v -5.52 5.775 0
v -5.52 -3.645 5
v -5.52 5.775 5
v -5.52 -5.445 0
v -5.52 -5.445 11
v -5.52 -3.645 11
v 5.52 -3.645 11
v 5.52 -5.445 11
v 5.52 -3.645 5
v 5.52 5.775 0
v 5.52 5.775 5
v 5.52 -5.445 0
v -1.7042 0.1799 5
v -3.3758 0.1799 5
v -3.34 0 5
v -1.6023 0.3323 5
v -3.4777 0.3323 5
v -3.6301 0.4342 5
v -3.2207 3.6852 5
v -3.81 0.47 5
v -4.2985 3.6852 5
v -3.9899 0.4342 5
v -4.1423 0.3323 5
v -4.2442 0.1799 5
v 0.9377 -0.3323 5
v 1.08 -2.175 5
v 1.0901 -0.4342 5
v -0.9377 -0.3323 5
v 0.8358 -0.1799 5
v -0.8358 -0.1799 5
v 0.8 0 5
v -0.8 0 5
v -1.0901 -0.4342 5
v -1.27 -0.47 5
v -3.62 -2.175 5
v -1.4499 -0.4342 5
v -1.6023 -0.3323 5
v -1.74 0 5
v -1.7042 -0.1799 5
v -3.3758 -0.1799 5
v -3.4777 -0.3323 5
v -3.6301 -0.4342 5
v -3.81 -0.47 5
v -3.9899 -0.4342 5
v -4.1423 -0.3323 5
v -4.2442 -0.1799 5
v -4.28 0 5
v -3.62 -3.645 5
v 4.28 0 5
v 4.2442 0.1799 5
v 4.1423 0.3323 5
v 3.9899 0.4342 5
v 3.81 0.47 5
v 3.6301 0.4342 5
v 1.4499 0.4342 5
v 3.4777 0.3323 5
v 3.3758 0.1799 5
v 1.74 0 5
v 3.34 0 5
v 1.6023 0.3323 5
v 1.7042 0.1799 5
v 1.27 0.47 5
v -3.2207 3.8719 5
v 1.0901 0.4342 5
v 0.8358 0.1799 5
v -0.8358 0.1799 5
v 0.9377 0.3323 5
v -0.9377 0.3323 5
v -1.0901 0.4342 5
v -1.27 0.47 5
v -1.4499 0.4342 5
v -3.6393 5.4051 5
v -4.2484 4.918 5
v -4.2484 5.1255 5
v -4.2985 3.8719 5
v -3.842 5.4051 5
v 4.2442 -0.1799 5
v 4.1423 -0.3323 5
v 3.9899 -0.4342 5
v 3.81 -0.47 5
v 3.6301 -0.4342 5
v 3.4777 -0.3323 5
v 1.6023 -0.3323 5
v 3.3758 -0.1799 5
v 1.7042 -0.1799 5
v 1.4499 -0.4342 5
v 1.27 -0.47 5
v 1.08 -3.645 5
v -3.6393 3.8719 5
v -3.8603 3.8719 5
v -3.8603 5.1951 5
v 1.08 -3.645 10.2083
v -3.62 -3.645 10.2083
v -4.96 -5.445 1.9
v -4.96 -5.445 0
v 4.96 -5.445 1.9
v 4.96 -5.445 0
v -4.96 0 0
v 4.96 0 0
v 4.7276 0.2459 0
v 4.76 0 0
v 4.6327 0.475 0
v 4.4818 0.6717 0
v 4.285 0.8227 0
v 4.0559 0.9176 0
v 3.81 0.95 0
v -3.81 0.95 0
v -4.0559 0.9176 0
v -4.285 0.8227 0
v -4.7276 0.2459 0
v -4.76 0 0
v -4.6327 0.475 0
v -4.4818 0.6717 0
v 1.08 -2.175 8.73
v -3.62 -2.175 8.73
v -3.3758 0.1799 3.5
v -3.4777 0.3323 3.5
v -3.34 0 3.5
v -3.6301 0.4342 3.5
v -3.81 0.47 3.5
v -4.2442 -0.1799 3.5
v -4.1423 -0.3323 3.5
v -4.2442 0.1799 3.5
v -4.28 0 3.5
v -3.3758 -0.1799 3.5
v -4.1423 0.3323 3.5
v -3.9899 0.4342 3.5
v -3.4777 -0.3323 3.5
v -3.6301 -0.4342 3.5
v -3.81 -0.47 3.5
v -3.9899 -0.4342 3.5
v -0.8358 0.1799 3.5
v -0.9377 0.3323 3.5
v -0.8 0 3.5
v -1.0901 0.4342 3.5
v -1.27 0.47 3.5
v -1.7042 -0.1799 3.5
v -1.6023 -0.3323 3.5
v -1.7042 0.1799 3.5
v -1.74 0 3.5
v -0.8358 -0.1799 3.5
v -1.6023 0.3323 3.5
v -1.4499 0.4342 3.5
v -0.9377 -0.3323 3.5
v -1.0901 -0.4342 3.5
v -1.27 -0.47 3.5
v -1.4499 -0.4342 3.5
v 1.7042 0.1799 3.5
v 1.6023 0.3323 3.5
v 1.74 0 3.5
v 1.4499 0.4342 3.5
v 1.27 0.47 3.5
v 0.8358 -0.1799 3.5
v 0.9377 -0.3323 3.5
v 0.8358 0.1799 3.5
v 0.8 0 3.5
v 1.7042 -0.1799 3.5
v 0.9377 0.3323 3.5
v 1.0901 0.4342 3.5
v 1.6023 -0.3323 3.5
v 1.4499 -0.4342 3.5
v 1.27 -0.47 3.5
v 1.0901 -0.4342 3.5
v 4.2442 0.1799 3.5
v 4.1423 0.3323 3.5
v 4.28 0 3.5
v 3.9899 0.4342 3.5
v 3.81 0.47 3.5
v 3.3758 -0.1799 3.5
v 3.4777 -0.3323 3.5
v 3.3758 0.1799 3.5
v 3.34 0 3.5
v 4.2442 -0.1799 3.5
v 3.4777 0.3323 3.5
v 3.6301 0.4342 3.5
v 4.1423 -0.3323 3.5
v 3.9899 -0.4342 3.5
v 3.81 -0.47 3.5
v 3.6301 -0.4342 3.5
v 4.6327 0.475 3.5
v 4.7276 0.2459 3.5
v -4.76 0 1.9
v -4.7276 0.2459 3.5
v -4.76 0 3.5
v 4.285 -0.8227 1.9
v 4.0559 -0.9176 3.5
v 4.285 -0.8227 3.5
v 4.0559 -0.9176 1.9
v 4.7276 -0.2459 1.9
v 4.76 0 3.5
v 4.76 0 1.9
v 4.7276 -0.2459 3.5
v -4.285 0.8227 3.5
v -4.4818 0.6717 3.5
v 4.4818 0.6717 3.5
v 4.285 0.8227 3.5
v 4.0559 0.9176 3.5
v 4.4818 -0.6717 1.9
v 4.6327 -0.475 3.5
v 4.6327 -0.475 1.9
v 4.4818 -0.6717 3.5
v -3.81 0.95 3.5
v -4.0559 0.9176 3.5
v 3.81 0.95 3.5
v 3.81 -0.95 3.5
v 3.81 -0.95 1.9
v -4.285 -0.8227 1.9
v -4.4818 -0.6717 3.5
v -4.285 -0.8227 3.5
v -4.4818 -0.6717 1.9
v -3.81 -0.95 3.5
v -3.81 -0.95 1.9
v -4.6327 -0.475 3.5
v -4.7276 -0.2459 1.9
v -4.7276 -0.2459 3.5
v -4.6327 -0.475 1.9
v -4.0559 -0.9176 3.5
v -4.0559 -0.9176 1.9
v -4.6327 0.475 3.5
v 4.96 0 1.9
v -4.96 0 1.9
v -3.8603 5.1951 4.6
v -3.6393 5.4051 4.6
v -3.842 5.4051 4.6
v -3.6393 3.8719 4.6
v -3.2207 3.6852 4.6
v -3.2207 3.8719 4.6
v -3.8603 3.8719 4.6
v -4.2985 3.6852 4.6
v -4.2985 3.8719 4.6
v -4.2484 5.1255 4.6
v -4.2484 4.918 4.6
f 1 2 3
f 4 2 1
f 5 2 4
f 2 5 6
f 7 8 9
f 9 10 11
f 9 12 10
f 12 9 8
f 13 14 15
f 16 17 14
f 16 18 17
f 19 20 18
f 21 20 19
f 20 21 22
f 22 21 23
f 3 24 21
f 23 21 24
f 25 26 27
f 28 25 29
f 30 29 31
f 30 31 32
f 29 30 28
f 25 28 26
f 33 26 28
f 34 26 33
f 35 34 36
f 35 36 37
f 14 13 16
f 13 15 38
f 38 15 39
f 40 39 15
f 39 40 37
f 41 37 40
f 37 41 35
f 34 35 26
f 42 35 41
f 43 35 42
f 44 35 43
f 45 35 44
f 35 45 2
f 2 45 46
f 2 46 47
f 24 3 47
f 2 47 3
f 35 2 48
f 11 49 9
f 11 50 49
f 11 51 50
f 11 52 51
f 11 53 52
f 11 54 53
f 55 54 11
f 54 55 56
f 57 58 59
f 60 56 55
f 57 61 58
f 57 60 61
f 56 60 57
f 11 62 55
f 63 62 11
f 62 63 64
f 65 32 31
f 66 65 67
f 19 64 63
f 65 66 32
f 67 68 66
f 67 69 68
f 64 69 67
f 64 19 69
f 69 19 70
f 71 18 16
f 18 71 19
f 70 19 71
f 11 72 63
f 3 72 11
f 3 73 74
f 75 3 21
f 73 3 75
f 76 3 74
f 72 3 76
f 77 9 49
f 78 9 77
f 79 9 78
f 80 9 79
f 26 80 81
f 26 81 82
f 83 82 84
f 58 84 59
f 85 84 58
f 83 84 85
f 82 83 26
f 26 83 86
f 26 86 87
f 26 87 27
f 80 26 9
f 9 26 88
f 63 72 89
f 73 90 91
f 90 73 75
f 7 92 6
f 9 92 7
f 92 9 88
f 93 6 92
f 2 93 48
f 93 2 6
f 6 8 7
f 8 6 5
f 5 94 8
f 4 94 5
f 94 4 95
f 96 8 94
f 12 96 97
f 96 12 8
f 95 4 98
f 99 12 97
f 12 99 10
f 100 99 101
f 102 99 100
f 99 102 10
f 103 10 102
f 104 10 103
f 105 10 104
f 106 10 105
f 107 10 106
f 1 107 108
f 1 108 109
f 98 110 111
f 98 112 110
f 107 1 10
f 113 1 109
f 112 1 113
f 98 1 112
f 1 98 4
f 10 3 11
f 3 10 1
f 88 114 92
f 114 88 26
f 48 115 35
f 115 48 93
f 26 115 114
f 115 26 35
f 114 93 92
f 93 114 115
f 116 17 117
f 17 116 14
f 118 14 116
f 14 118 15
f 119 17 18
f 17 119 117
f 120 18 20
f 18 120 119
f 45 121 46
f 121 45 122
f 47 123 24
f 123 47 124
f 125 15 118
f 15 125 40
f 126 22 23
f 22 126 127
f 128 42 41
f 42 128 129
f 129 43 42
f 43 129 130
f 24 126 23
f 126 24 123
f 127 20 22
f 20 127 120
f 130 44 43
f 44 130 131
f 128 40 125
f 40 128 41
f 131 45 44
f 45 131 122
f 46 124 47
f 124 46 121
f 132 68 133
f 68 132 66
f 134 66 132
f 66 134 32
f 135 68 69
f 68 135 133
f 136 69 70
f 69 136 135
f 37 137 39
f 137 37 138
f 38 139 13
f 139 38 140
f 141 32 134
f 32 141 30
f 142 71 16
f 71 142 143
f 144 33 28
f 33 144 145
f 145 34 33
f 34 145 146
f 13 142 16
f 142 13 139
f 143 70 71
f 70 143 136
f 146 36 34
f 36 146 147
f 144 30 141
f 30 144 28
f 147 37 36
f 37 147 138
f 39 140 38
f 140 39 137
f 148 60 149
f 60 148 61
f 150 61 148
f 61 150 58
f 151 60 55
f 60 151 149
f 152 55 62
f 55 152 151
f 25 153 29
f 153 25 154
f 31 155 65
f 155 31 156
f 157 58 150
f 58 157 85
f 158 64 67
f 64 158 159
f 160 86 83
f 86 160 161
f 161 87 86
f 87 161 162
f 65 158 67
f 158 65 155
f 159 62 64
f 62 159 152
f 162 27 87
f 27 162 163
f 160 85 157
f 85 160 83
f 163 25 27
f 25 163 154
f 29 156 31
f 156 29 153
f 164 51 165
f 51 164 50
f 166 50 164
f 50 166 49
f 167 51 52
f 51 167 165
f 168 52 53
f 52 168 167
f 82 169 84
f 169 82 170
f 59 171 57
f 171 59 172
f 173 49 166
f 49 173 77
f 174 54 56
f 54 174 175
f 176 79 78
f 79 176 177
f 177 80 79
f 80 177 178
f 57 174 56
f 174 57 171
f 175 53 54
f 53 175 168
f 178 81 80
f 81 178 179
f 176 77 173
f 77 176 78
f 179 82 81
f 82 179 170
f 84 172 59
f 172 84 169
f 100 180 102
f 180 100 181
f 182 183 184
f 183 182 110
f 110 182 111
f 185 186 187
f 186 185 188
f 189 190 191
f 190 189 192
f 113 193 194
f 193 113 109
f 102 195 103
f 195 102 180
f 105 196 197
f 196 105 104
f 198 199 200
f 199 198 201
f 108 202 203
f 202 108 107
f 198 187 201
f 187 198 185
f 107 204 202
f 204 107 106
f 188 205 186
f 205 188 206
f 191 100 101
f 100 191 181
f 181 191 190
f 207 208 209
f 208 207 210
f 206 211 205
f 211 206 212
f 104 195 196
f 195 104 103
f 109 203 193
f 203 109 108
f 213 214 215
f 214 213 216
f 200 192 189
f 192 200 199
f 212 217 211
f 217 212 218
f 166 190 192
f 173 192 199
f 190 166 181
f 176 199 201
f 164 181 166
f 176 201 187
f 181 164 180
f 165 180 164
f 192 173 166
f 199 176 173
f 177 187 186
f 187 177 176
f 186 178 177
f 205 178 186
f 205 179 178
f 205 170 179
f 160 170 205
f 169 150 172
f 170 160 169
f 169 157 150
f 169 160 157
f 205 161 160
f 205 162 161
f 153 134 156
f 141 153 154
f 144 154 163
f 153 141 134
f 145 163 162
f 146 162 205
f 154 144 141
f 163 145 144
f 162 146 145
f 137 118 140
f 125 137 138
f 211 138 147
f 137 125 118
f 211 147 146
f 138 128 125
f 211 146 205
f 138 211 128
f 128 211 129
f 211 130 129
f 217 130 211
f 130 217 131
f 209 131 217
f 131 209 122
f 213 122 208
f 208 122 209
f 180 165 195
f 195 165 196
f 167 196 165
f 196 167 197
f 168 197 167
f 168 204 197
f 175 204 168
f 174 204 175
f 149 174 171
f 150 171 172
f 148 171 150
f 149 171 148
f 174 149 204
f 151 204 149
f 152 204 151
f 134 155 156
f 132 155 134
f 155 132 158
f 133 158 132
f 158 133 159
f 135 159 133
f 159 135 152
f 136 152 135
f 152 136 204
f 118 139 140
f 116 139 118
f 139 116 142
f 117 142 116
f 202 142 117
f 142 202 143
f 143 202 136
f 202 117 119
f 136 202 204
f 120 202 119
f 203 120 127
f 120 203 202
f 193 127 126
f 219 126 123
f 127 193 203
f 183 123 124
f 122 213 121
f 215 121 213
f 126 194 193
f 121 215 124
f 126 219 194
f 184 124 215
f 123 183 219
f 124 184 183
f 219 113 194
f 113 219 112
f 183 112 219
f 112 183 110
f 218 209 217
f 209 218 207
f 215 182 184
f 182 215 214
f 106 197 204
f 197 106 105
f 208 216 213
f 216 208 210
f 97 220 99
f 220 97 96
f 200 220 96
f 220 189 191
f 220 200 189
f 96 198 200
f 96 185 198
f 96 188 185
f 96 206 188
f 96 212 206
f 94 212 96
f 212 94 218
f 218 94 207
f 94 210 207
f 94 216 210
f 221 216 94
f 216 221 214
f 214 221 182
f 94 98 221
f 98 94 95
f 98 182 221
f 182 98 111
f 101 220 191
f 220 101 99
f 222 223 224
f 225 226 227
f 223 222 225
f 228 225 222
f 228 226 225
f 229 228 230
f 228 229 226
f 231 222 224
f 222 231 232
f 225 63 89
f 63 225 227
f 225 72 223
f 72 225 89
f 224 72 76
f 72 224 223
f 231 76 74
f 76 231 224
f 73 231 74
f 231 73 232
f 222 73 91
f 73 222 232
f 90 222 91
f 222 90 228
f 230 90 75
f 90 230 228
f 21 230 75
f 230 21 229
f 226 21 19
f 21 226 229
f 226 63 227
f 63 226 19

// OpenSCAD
// SPDX-FileCopyrightText: 2026 Alon A. Rabinowitz
// SPDX-License-Identifier: CC-BY-4.0

// The male, 4 pins, as it prints. Everything is in fan-connector.scad; this file only picks the part.
include <fan-connector.scad>
part = "male";
pins = 4;
